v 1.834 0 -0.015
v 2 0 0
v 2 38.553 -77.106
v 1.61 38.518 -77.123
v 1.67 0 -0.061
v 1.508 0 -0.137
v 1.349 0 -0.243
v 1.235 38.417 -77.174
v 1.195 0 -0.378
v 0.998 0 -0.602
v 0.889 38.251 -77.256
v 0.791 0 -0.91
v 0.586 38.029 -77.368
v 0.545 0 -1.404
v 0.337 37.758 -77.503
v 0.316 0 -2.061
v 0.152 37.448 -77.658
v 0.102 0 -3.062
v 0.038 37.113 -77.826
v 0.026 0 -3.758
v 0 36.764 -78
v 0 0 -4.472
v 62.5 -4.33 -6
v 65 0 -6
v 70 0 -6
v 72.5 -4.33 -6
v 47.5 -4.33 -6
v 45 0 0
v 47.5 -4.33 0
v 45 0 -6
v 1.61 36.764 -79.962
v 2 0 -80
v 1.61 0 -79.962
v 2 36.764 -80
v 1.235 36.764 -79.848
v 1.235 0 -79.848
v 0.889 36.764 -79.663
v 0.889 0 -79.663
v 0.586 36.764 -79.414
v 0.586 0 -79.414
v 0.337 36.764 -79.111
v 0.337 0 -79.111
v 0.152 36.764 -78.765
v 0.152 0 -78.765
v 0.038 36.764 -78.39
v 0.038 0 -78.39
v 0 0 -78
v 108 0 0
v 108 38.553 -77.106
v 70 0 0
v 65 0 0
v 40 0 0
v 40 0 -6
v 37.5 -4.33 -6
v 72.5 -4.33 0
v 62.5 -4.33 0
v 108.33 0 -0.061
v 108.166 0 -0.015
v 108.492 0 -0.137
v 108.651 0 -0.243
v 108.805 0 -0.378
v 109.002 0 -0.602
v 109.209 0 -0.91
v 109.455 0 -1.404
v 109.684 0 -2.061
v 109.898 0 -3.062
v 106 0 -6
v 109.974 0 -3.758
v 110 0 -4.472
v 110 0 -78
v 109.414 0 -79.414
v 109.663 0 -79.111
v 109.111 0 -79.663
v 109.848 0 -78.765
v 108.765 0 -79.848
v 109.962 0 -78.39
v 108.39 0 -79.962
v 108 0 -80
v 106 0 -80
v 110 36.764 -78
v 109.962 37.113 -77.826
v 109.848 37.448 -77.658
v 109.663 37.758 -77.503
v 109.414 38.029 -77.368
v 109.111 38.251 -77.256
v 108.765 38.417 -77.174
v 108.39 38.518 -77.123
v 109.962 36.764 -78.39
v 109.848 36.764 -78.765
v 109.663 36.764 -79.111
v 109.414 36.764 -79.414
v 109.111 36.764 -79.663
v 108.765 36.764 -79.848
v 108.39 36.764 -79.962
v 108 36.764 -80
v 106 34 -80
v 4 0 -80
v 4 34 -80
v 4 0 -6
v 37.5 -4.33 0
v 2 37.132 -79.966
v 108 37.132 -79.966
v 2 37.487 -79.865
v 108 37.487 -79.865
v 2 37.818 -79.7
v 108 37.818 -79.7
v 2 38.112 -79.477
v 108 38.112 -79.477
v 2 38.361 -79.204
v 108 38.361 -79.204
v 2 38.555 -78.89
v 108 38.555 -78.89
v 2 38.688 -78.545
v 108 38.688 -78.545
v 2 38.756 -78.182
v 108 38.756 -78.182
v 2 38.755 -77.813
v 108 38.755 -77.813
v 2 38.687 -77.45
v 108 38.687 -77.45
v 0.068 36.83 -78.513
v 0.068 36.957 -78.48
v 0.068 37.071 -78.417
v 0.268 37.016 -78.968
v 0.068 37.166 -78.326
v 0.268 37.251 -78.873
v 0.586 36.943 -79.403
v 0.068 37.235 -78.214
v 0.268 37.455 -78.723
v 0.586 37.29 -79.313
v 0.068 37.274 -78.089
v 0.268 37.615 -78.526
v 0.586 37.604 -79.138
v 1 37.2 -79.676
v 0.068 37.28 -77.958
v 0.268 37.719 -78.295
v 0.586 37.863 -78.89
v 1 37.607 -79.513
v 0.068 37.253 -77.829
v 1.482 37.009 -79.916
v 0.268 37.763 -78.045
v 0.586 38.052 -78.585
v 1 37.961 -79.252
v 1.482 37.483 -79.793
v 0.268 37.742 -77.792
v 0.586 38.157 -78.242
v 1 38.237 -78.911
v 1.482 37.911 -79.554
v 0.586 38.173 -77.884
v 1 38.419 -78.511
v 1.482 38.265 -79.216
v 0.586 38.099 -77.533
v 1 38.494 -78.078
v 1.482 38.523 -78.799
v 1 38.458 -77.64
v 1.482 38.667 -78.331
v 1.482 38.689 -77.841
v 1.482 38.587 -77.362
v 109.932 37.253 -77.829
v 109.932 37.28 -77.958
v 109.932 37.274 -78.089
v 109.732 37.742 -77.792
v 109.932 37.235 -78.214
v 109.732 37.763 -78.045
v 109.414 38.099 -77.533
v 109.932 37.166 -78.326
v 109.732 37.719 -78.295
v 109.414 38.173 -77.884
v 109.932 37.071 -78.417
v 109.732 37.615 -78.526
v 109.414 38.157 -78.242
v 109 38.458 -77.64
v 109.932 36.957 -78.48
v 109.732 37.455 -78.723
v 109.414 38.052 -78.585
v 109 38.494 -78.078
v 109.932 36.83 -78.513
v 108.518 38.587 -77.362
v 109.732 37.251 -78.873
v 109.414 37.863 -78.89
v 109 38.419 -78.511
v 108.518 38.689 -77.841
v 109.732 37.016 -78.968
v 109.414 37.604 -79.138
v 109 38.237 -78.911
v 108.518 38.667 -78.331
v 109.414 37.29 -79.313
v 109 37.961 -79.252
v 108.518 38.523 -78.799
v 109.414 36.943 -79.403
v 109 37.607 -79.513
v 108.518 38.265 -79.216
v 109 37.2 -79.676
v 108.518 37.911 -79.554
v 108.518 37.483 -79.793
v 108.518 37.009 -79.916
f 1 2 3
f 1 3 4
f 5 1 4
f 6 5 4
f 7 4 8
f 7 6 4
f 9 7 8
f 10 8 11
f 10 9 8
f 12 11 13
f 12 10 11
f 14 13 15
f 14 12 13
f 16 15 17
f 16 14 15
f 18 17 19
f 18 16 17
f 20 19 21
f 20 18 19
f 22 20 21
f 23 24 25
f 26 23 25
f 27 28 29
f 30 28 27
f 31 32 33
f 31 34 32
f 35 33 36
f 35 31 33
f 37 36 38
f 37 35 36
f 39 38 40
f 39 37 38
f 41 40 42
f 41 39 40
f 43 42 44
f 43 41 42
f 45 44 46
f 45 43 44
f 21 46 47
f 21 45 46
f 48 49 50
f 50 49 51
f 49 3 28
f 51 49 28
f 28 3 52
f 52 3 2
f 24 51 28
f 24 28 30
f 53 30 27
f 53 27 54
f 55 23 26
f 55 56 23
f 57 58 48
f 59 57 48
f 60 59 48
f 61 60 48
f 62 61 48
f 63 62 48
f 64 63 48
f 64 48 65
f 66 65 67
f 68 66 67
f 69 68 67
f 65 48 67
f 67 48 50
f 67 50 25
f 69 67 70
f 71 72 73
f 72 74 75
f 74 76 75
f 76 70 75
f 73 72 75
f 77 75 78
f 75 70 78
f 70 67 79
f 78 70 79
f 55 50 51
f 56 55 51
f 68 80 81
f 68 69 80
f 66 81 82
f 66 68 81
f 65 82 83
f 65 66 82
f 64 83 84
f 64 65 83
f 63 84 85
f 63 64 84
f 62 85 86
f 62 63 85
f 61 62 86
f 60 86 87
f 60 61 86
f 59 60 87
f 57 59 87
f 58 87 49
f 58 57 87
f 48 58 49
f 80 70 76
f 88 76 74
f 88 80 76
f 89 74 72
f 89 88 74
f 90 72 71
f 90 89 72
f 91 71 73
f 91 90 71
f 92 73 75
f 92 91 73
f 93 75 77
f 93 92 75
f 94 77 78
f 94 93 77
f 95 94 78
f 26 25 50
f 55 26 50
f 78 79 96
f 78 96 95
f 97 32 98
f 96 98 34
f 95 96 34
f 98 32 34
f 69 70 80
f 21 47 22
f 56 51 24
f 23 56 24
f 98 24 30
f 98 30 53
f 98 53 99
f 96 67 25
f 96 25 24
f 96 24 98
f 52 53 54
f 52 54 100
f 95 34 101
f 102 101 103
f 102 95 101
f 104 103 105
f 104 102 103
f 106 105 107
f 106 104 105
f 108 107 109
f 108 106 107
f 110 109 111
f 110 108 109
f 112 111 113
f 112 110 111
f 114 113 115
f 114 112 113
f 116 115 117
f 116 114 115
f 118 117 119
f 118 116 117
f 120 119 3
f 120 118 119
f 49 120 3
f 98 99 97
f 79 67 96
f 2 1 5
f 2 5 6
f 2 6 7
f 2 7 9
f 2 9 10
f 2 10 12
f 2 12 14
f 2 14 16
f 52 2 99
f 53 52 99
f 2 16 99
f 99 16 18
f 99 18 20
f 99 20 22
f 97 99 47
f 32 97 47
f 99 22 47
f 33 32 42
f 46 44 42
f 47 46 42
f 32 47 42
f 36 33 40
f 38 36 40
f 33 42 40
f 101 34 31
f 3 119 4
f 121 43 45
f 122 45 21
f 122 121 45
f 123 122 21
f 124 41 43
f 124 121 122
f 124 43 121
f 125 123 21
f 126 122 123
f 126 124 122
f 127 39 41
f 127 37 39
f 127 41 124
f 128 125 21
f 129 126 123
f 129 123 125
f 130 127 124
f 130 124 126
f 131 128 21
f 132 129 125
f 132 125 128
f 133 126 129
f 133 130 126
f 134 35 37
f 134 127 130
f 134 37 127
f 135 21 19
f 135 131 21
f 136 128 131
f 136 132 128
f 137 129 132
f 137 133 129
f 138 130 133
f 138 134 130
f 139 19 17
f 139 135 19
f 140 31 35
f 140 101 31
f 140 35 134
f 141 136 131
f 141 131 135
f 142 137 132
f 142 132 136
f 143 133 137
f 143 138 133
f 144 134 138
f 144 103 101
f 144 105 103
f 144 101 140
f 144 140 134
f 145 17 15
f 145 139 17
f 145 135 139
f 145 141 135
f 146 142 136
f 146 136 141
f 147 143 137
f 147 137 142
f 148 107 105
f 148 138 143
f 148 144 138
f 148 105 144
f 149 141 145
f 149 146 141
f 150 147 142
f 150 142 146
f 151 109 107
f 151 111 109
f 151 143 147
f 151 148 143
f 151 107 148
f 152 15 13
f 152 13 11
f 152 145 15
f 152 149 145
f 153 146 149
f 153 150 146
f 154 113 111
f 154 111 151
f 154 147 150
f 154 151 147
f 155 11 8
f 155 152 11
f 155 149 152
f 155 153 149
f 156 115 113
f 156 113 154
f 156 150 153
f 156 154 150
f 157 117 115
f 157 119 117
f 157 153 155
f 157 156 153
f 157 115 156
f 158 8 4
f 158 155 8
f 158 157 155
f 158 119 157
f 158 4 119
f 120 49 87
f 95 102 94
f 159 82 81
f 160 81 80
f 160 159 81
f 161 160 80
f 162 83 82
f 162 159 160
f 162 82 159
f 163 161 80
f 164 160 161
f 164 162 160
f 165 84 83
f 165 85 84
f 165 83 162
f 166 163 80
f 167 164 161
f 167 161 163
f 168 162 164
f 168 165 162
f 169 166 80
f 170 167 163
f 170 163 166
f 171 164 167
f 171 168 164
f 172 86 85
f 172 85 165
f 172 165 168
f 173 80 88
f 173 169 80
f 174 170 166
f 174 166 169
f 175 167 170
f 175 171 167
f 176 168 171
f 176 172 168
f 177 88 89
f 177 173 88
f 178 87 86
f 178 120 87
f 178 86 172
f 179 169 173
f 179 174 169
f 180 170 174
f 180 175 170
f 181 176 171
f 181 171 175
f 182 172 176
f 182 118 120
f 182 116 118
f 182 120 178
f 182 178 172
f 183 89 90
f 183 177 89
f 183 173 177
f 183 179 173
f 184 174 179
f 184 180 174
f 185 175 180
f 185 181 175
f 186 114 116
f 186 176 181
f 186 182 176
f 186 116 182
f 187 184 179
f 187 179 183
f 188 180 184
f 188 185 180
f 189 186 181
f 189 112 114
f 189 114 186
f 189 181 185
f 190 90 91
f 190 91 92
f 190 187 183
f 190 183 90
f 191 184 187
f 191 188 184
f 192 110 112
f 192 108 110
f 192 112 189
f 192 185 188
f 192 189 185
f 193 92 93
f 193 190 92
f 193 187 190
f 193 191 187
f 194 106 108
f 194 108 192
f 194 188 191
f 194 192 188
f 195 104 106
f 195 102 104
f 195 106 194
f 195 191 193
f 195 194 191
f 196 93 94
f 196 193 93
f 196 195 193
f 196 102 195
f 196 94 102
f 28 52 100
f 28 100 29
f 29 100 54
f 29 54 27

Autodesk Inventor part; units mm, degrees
ref_plane "YZ Plane" through (0, 0, 0) normal (1, 0, 0) x (0, 1, 0)
ref_plane "XY Plane" through (0, 0, 0) normal (0, 0, 1) x (1, 0, 0)
sketch "Sketch1" plane through (0, 0, 0) normal (1, 0, 0) x (0, 1, 0)
  line L0 (0, 0) -> (0, -80)
  line L1 (0, 0) -> (80, 0) construction
  line L2 (0, -80) -> (40, -80)
  line L3 (0, -80) -> (40, -80) construction
  line L4 (40, -80) -> (0, 0)
  dimension "d0" = 80
  dimension "d1" = 90
  dimension "d2" = 40
  dimension "d3" = 0
extrude "Extrusion1" add sketch "Sketch1" along normal blind 110
ref_plane "Work Plane1" through (106, 0, 0) normal (1, 0, 0) x (0, 0, -1)
sketch "Sketch2" plane through (106, 0, 0) normal (1, 0, 0) x (0, 0, -1)
  line L0 (0, 0) -> (80, 0) projected
  line L1 (80, 0) -> (80, 40) projected
  line L2 (80, 40) -> (0, 0) projected
  line L3 (0, 0) -> (80, 0) projected
  line L4 (80, 0) -> (80, 34)
  line L5 (80, 0) -> (80, 40) projected
  line L6 (80, 0) -> (114, 0) construction
  line L7 (80, 0) -> (6, 0)
  line L8 (80, 0) -> (154, 0) construction
  line L9 (6, 0) -> (80, 34)
  dimension "d7" = 34
  dimension "d8" = 90
  dimension "d9" = 74
  dimension "d10" = 180
extrude "Extrusion2" cut sketch "Sketch2" against normal blind 102 contours L9 L1 L0
sketch "Sketch3" plane through (0, 0, -80) normal (0, -1, 0) x (1, 0, 0)
  line L0 (0, 80) -> (0, 0) construction
  line L1 (0, 80) -> (37.5, 80) construction
  line L2 (0, 80) -> (37.5, 80) construction
  line L3 (106, 74) -> (106, 0) construction
  line L4 (106, 0) -> (110, 0) construction
  line L5 (110, 80) -> (110, 0) construction
  line L6 (0, 80) -> (110, 80) construction
  line L7 (0, 80) -> (0, 0) construction
  line L8 (0, 0) -> (4, 0) construction
  line L9 (4, 0) -> (4, 74) construction
  line L10 (4, 74) -> (106, 74) construction
  line L11 (110, 80) -> (110, 0) construction
  line L12 (110, 80) -> (72.5, 80) construction
  line L13 (0, 80) -> (110, 80) construction
  line L14 (110, 80) -> (147.5, 80) construction
  line L15 (37.5, 80) -> (47.5, 80)
  line L16 (47.5, 80) -> (47.5, 74)
  line L17 (47.5, 74) -> (37.5, 74)
  line L18 (37.5, 74) -> (37.5, 80)
  line L19 (72.5, 80) -> (62.5, 80)
  line L20 (62.5, 80) -> (62.5, 74)
  line L21 (62.5, 74) -> (72.5, 74)
  line L22 (72.5, 74) -> (72.5, 80)
  dimension "d13" = 37.5
  dimension "d14" = 0
  dimension "d17" = 37.5
  dimension "d18" = 180
  dimension "d21" = 10
  dimension "d22" = 6
  dimension "d23" = 10
  dimension "d24" = 6
extrude "Extrusion3" add sketch "Sketch3" along normal blind 4.33
draft "FaceDraft1" angle 30 pull direction (0, 1, 0) faces at (47.5, -1.4433, -2) fixed edges at (47.5, -4.33, -3)
draft "FaceDraft2" angle 30 pull direction (0, 1, 0) faces at (37.5, -1.4433, -4) fixed edges at (37.5, -4.33, -3)
draft "FaceDraft4" angle -30 pull direction (0, -1, 0) faces at (72.5, -1.4433, -4) fixed edges at (72.5, -4.33, -3)
fillet "Fillet2" radius 2 5 edges at (110, 20, -40) (110, 20, -80) (55, 40, -80) (0, 20, -80) (0, 20, -40)
draft "FaceDraft5" angle 30 pull direction (0, 1, 0) faces at (62.5, -1.4433, -2) fixed edges at (62.5, -4.33, -3)
properties part number "foot_cover_2_top"
